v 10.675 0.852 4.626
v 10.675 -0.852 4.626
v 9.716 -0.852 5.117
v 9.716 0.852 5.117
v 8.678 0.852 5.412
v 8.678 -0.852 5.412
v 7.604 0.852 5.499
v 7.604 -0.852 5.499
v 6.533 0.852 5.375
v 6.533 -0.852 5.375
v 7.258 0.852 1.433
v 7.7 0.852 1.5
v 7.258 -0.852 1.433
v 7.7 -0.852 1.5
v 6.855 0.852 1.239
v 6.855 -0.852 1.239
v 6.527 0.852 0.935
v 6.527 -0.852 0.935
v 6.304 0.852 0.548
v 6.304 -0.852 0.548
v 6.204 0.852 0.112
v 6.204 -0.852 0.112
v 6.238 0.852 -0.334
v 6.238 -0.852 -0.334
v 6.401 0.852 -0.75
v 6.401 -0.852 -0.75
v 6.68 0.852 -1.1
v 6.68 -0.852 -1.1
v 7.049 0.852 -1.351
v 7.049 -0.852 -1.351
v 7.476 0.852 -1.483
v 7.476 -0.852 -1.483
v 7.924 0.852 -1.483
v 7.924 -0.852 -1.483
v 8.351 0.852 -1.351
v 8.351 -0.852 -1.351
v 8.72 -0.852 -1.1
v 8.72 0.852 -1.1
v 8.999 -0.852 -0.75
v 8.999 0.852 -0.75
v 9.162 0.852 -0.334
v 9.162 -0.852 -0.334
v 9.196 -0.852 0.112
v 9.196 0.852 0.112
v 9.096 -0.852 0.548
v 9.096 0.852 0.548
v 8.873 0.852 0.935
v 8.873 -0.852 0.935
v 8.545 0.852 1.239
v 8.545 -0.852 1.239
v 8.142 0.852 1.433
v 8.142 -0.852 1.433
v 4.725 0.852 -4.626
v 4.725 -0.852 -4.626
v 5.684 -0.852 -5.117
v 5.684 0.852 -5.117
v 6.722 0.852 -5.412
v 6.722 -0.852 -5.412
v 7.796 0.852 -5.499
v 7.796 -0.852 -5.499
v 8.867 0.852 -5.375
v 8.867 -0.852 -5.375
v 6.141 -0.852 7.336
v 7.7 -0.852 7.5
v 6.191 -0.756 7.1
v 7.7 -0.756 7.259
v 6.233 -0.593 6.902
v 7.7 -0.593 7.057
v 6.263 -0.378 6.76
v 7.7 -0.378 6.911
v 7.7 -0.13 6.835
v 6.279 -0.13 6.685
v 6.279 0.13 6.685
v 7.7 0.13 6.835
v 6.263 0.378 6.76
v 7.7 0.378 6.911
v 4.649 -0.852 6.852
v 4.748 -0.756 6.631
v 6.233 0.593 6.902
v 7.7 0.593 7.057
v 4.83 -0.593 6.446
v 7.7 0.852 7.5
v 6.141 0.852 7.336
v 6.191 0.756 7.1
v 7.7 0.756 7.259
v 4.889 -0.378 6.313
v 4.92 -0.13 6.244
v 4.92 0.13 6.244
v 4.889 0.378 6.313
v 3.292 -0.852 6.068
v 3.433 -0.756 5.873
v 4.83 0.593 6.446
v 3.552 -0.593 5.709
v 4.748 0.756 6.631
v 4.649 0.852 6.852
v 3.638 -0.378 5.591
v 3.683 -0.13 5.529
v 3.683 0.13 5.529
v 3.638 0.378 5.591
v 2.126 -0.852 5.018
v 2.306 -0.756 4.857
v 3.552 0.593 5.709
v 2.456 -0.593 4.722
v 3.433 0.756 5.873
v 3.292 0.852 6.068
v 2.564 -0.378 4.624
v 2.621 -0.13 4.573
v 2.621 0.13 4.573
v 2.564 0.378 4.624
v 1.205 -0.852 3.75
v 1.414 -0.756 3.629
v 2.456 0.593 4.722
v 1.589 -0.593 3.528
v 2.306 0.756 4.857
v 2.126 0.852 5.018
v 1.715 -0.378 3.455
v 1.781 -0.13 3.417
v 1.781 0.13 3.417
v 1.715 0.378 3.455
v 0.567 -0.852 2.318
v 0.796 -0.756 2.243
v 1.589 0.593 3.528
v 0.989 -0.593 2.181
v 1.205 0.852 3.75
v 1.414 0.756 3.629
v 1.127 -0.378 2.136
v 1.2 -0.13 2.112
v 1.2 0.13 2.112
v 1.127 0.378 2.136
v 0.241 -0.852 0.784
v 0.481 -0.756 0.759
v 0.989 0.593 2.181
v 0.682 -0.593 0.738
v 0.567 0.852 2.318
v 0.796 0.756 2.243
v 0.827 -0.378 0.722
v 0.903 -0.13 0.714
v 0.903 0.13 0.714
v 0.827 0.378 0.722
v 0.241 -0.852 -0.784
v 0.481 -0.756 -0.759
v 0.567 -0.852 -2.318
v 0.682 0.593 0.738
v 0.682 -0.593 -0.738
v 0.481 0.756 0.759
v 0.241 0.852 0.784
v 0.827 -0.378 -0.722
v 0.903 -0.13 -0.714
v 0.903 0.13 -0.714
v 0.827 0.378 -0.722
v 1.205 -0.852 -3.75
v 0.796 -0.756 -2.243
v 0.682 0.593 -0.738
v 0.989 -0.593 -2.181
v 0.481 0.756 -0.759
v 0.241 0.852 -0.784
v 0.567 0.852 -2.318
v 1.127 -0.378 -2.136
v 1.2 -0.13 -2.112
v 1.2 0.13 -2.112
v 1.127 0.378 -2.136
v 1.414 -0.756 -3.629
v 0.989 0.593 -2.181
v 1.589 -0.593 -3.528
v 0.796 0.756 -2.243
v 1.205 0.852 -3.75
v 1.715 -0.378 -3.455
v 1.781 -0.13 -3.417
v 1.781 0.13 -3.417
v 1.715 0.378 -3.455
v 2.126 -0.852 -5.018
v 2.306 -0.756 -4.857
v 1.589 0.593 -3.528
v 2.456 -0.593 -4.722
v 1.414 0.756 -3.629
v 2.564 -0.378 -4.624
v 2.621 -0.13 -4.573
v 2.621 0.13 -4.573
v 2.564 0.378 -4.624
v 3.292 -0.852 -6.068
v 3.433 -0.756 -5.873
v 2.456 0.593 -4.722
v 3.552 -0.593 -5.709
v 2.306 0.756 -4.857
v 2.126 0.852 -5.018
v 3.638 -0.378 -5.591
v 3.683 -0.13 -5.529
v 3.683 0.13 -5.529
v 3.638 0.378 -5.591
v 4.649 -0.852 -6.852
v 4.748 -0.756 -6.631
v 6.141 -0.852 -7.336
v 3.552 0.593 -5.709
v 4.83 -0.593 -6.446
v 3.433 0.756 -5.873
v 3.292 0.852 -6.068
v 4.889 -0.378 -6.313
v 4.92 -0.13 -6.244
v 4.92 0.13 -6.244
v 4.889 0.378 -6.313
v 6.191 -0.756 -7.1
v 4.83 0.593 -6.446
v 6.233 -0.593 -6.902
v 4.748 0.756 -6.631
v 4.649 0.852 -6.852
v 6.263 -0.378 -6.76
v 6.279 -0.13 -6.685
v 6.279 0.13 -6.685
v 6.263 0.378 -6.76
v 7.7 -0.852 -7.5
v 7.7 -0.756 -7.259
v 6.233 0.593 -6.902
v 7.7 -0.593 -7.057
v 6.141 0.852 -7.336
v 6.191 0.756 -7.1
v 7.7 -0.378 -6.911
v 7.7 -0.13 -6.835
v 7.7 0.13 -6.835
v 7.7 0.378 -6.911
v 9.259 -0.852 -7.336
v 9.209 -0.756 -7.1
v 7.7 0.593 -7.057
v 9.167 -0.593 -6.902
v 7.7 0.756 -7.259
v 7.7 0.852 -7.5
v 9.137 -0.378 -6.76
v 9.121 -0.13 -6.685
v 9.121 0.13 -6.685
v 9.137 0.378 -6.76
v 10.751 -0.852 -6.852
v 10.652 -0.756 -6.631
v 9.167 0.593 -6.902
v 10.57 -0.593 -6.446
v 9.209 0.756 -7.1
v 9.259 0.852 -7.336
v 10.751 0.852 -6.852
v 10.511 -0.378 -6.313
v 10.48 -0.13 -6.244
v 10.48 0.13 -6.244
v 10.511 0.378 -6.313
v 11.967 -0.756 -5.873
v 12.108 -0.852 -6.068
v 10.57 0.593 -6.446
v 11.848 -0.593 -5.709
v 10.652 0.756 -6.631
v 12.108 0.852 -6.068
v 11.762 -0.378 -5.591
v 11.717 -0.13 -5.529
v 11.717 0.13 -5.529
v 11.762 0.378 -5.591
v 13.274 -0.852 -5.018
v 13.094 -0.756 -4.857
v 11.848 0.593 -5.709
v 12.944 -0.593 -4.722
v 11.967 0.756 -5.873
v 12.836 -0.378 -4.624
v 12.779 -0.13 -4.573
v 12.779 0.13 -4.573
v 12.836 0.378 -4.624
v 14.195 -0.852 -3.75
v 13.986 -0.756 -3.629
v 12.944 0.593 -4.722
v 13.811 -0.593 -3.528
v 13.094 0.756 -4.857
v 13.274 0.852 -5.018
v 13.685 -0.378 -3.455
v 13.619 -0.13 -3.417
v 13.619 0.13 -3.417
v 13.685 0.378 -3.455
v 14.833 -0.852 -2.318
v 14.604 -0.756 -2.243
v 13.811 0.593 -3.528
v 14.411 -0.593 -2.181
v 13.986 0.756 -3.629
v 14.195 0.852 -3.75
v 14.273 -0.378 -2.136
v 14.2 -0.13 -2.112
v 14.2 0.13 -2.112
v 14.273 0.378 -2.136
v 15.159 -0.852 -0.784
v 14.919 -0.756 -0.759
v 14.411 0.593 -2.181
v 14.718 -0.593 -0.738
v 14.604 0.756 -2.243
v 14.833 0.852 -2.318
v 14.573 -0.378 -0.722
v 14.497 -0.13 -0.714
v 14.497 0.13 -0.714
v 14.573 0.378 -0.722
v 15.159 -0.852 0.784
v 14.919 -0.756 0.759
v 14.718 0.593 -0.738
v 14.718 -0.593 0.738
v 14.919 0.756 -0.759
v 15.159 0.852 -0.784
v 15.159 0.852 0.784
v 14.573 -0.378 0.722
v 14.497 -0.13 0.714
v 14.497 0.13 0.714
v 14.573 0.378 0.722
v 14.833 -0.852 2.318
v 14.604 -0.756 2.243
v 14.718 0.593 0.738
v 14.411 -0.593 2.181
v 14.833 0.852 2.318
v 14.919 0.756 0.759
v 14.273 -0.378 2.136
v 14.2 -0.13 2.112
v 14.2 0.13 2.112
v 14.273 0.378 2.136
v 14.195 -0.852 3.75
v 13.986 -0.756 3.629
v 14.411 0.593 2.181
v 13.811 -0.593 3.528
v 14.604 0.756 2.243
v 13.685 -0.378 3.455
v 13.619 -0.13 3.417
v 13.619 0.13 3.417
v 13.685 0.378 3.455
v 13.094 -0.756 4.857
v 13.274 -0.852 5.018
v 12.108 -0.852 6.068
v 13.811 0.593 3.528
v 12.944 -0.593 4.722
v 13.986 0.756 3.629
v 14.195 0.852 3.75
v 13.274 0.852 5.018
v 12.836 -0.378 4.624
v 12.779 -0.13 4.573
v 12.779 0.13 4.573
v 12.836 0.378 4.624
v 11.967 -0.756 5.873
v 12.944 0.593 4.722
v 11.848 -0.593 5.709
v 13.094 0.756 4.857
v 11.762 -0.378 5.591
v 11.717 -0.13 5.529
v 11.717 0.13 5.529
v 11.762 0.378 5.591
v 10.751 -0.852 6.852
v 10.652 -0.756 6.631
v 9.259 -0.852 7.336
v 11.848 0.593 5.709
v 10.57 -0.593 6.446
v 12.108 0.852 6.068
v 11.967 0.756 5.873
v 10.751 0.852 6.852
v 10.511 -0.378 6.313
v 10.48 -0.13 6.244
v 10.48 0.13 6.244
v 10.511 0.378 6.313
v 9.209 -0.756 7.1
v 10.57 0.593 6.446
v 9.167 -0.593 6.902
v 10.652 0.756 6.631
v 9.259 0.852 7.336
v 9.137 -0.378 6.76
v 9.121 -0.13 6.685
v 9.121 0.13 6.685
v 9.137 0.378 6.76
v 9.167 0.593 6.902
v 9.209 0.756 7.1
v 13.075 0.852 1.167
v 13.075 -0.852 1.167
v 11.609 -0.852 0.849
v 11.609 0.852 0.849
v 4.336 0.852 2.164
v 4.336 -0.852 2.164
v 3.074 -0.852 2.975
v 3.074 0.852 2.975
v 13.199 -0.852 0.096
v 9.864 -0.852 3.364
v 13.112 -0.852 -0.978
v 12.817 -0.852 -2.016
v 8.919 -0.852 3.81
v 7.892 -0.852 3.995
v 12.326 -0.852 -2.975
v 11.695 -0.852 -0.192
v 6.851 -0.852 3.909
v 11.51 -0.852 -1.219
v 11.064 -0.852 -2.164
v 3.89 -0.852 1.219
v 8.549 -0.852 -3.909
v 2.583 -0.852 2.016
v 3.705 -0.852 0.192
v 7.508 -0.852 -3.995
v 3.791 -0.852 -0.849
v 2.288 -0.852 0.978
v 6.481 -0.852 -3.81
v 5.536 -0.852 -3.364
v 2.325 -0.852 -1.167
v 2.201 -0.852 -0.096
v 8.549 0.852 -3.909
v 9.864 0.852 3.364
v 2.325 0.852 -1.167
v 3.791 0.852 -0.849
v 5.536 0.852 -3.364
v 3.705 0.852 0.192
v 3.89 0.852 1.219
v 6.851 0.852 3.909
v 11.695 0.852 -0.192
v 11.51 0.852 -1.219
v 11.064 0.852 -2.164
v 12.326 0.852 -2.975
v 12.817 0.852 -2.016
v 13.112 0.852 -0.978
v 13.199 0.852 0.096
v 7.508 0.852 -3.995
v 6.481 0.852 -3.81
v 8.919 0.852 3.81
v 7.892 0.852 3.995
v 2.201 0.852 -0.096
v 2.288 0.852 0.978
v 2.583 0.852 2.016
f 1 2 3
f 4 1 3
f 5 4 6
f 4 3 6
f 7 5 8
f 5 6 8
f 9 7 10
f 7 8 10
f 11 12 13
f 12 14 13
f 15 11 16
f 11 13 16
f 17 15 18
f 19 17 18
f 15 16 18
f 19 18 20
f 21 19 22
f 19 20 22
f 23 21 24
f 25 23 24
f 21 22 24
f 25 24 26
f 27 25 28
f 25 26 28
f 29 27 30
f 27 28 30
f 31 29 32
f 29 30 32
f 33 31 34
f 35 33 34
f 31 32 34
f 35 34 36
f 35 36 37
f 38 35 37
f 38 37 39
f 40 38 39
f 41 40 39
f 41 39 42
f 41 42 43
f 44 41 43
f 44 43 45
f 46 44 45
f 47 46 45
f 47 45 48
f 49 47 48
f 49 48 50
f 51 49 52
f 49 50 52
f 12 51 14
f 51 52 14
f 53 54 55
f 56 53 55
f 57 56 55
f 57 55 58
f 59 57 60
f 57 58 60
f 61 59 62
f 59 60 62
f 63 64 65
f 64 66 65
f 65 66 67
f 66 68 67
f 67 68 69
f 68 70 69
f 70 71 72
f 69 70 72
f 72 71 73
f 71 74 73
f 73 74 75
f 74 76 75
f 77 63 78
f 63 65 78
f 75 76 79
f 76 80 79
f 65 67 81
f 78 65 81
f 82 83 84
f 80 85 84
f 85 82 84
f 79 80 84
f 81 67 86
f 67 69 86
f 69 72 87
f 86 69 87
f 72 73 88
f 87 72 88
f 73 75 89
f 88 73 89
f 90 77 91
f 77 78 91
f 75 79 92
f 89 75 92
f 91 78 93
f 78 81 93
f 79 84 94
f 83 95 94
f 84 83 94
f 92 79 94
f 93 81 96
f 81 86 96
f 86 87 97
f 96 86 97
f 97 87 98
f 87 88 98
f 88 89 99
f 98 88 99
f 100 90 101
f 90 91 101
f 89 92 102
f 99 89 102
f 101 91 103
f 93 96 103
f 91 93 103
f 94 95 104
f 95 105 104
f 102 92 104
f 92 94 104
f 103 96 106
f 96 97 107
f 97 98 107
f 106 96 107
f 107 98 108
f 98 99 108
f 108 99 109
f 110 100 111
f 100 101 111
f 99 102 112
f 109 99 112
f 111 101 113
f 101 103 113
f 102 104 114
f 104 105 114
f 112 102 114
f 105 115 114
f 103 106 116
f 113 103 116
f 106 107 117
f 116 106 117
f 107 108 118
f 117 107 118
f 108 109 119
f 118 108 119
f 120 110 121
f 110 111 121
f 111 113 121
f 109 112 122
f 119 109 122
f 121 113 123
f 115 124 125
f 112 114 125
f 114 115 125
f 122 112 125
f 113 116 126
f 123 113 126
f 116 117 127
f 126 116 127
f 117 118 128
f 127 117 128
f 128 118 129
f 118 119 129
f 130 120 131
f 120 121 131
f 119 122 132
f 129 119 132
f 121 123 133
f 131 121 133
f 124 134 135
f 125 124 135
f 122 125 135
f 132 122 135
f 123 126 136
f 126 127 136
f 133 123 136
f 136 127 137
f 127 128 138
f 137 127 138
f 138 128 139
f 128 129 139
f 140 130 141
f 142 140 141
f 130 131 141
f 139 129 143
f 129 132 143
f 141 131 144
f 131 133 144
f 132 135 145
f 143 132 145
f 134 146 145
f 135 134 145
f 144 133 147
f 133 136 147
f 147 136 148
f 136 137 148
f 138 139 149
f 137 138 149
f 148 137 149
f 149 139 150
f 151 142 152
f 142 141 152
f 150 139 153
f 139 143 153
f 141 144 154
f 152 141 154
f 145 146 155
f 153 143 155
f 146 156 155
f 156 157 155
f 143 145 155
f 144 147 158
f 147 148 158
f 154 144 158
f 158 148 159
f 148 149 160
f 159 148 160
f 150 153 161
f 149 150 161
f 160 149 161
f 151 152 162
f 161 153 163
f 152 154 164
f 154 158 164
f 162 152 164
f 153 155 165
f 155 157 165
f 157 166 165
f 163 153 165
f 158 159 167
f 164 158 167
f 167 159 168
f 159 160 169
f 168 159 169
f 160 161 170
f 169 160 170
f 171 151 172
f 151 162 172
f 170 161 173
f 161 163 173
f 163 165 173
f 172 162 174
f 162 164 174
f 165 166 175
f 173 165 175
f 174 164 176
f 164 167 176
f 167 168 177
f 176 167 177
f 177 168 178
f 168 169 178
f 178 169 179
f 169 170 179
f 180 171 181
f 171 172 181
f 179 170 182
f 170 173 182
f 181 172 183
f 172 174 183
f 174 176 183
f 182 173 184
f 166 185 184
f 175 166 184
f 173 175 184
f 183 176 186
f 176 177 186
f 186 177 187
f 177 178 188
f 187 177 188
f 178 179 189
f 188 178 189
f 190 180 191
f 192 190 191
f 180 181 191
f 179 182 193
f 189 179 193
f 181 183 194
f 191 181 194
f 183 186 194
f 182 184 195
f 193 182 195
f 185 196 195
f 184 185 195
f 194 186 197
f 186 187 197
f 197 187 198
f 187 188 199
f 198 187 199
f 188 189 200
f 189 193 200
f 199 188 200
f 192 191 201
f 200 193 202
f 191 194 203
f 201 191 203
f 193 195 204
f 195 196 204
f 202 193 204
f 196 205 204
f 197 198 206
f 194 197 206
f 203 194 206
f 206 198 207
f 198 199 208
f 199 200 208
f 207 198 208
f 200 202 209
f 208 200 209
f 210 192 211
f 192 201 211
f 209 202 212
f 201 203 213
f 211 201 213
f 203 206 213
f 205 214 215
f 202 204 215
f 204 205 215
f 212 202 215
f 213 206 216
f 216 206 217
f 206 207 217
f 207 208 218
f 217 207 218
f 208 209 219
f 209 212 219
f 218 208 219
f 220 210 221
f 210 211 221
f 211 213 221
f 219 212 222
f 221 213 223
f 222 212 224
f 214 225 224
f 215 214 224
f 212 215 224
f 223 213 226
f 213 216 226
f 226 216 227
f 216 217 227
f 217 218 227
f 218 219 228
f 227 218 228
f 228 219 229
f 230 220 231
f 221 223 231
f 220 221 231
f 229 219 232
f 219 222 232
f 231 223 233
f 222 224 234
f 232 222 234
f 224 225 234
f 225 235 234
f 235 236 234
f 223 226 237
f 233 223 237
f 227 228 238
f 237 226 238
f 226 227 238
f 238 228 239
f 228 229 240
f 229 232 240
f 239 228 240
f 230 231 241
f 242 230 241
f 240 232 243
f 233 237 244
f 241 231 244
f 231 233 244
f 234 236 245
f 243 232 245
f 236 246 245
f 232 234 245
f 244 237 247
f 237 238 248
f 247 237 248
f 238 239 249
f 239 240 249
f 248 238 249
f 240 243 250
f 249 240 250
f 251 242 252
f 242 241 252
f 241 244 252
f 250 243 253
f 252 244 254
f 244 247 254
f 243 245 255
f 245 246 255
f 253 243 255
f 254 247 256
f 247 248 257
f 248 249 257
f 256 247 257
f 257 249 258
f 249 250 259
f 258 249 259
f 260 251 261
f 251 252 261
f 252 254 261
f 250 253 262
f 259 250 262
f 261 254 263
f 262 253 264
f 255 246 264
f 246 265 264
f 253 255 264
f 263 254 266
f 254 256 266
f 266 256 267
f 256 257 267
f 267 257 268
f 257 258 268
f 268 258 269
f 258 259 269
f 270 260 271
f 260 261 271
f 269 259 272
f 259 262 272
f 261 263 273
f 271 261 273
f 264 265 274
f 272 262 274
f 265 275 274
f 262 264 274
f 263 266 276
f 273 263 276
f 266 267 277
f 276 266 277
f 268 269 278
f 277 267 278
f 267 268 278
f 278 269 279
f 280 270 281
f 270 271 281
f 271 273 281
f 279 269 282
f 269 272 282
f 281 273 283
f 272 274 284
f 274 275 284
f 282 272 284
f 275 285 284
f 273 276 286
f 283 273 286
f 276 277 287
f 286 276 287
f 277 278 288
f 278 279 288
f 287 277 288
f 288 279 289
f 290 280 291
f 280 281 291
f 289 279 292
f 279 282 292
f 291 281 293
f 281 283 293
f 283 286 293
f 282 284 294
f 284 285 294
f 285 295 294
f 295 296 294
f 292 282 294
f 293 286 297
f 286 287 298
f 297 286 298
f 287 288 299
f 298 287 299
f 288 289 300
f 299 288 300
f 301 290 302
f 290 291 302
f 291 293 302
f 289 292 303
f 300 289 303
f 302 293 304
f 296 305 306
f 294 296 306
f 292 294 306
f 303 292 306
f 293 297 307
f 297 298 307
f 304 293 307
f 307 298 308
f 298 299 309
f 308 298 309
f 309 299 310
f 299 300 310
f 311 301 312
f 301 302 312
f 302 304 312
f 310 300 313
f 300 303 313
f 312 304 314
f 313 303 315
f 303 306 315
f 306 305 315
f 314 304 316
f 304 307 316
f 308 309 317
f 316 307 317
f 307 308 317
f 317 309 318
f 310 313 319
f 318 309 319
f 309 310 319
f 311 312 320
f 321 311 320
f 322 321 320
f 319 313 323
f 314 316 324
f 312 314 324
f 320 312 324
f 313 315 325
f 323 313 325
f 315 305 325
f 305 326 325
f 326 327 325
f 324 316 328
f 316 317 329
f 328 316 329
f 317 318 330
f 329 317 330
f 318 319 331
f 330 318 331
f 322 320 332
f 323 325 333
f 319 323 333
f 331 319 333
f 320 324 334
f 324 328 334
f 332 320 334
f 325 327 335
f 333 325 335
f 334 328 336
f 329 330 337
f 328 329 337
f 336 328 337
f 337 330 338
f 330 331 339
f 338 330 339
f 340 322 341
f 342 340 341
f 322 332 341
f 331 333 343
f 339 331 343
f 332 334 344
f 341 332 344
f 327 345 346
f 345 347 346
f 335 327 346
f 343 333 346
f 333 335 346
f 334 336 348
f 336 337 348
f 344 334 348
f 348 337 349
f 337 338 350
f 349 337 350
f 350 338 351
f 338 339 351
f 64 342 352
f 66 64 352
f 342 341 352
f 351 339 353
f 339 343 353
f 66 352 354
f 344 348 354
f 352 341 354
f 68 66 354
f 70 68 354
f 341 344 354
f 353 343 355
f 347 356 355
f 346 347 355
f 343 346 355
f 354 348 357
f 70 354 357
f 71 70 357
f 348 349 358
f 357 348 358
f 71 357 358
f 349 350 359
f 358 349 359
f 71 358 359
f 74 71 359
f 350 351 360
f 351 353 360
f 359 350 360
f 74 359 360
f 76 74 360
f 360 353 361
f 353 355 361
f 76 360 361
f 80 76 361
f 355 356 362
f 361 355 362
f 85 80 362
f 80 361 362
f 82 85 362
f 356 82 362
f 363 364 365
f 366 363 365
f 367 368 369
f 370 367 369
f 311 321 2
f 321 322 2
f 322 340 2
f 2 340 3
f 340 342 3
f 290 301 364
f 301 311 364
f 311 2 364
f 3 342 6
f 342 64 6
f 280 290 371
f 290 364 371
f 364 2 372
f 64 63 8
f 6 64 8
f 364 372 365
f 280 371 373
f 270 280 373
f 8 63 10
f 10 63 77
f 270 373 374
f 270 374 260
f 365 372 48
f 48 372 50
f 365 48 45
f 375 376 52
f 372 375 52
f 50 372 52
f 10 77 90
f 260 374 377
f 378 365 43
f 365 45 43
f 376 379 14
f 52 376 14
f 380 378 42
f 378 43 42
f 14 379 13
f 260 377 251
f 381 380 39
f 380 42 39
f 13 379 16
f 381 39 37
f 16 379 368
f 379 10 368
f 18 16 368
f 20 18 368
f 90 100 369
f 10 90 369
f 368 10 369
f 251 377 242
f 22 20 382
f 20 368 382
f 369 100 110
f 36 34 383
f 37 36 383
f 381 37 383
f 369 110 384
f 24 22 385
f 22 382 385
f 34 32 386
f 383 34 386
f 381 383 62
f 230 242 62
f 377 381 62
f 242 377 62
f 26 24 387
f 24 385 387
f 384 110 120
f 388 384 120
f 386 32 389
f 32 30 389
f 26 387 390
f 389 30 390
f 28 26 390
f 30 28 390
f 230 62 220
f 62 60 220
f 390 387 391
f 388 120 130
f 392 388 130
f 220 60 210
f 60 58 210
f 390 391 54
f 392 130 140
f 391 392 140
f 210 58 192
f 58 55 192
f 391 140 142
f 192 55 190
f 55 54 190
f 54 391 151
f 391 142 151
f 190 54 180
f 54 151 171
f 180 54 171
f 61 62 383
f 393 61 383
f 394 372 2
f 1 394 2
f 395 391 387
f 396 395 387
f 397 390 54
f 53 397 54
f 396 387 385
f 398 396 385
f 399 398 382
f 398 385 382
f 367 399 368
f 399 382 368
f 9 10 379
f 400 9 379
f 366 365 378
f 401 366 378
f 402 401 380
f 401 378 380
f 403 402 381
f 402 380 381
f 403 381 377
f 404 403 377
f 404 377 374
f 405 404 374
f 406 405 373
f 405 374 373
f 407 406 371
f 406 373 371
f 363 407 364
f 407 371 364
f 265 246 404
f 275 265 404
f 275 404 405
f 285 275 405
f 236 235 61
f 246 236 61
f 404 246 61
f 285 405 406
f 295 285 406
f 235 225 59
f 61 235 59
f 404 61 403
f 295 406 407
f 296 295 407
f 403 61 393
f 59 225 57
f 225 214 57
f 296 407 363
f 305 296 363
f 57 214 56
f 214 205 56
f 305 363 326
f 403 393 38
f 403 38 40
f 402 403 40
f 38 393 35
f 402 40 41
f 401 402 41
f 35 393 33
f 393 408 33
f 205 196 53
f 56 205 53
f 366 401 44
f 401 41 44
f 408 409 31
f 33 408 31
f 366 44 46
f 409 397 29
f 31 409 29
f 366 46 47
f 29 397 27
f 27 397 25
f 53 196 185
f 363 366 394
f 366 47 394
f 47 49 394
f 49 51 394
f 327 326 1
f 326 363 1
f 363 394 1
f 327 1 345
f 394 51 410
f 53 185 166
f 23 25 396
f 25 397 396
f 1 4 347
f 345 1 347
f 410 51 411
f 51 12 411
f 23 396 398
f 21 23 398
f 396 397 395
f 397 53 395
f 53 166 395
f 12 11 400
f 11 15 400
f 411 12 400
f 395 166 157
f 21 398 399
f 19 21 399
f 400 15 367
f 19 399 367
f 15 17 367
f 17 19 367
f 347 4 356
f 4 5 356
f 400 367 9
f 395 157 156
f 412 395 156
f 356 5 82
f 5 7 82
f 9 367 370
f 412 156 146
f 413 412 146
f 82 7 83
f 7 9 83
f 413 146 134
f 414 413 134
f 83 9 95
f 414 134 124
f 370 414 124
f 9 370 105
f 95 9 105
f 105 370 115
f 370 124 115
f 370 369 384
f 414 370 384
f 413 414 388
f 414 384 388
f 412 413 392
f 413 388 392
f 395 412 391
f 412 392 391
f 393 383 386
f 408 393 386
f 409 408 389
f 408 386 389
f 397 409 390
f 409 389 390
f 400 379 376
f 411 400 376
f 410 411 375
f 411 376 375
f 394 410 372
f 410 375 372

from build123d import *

# Parameters (mm, degrees)
TAGLIO_ESTRUSIONE1_DEPTH    = 18.035037423
RIPETIZIONECIRCOLARE1_COUNT = 4


with BuildPart() as part:
    # Schizzo1 → Rivoluzione1 (revolve)
    with BuildSketch(Plane.XY, mode=Mode.PRIVATE) as rivoluzione1_sk:
        with BuildLine():
            Line((0.2, 0.851836252), (6.2, 0.851836252))
            Line((6.2, 0.851836252), (6.2, -0.851836252))
            Line((6.2, -0.851836252), (0.2, -0.851836252))
            ThreePointArc((0.2, -0.851836252), (0.875, 0), (0.2, 0.851836252))
        make_face()
    revolve(rivoluzione1_sk.sketch.rotate(Axis((7.7, 1.619035734, 0), (0, -1, 0)), 270), axis=Axis((7.7, 1.619035734, 0), (0, -1, 0)))

    # Schizzo2 → Taglio-Estrusione1 (cut, through all)
    with BuildSketch(Plane.XZ.offset(0.851836252)):
        with BuildLine():
            Line((4.335758437, 2.163764938), (3.074167851, 2.97517679))
            ThreePointArc((3.074167851, 2.97517679), (2.287737491, 0.978475617), (2.325275036, -1.167189598))
            Line((2.325275036, -1.167189598), (3.791109117, -0.848865162))
            ThreePointArc((3.791109117, -0.848865162), (3.763809084, 0.711618631), (4.335758437, 2.163764938))
        make_face()
    taglio_estrusione1 = extrude(amount=-TAGLIO_ESTRUSIONE1_DEPTH, mode=Mode.SUBTRACT)

    # RipetizioneCircolare1: Taglio-Estrusione1 ×4 about axis
    ripetizionecircolare1_axis = Axis((7.7, -0.851836252, 0), (0, 1, 0))
    for i in range(1, RIPETIZIONECIRCOLARE1_COUNT):
        add(taglio_estrusione1.rotate(ripetizionecircolare1_axis, i * 360 / RIPETIZIONECIRCOLARE1_COUNT), mode=Mode.SUBTRACT)


solid = part.part
